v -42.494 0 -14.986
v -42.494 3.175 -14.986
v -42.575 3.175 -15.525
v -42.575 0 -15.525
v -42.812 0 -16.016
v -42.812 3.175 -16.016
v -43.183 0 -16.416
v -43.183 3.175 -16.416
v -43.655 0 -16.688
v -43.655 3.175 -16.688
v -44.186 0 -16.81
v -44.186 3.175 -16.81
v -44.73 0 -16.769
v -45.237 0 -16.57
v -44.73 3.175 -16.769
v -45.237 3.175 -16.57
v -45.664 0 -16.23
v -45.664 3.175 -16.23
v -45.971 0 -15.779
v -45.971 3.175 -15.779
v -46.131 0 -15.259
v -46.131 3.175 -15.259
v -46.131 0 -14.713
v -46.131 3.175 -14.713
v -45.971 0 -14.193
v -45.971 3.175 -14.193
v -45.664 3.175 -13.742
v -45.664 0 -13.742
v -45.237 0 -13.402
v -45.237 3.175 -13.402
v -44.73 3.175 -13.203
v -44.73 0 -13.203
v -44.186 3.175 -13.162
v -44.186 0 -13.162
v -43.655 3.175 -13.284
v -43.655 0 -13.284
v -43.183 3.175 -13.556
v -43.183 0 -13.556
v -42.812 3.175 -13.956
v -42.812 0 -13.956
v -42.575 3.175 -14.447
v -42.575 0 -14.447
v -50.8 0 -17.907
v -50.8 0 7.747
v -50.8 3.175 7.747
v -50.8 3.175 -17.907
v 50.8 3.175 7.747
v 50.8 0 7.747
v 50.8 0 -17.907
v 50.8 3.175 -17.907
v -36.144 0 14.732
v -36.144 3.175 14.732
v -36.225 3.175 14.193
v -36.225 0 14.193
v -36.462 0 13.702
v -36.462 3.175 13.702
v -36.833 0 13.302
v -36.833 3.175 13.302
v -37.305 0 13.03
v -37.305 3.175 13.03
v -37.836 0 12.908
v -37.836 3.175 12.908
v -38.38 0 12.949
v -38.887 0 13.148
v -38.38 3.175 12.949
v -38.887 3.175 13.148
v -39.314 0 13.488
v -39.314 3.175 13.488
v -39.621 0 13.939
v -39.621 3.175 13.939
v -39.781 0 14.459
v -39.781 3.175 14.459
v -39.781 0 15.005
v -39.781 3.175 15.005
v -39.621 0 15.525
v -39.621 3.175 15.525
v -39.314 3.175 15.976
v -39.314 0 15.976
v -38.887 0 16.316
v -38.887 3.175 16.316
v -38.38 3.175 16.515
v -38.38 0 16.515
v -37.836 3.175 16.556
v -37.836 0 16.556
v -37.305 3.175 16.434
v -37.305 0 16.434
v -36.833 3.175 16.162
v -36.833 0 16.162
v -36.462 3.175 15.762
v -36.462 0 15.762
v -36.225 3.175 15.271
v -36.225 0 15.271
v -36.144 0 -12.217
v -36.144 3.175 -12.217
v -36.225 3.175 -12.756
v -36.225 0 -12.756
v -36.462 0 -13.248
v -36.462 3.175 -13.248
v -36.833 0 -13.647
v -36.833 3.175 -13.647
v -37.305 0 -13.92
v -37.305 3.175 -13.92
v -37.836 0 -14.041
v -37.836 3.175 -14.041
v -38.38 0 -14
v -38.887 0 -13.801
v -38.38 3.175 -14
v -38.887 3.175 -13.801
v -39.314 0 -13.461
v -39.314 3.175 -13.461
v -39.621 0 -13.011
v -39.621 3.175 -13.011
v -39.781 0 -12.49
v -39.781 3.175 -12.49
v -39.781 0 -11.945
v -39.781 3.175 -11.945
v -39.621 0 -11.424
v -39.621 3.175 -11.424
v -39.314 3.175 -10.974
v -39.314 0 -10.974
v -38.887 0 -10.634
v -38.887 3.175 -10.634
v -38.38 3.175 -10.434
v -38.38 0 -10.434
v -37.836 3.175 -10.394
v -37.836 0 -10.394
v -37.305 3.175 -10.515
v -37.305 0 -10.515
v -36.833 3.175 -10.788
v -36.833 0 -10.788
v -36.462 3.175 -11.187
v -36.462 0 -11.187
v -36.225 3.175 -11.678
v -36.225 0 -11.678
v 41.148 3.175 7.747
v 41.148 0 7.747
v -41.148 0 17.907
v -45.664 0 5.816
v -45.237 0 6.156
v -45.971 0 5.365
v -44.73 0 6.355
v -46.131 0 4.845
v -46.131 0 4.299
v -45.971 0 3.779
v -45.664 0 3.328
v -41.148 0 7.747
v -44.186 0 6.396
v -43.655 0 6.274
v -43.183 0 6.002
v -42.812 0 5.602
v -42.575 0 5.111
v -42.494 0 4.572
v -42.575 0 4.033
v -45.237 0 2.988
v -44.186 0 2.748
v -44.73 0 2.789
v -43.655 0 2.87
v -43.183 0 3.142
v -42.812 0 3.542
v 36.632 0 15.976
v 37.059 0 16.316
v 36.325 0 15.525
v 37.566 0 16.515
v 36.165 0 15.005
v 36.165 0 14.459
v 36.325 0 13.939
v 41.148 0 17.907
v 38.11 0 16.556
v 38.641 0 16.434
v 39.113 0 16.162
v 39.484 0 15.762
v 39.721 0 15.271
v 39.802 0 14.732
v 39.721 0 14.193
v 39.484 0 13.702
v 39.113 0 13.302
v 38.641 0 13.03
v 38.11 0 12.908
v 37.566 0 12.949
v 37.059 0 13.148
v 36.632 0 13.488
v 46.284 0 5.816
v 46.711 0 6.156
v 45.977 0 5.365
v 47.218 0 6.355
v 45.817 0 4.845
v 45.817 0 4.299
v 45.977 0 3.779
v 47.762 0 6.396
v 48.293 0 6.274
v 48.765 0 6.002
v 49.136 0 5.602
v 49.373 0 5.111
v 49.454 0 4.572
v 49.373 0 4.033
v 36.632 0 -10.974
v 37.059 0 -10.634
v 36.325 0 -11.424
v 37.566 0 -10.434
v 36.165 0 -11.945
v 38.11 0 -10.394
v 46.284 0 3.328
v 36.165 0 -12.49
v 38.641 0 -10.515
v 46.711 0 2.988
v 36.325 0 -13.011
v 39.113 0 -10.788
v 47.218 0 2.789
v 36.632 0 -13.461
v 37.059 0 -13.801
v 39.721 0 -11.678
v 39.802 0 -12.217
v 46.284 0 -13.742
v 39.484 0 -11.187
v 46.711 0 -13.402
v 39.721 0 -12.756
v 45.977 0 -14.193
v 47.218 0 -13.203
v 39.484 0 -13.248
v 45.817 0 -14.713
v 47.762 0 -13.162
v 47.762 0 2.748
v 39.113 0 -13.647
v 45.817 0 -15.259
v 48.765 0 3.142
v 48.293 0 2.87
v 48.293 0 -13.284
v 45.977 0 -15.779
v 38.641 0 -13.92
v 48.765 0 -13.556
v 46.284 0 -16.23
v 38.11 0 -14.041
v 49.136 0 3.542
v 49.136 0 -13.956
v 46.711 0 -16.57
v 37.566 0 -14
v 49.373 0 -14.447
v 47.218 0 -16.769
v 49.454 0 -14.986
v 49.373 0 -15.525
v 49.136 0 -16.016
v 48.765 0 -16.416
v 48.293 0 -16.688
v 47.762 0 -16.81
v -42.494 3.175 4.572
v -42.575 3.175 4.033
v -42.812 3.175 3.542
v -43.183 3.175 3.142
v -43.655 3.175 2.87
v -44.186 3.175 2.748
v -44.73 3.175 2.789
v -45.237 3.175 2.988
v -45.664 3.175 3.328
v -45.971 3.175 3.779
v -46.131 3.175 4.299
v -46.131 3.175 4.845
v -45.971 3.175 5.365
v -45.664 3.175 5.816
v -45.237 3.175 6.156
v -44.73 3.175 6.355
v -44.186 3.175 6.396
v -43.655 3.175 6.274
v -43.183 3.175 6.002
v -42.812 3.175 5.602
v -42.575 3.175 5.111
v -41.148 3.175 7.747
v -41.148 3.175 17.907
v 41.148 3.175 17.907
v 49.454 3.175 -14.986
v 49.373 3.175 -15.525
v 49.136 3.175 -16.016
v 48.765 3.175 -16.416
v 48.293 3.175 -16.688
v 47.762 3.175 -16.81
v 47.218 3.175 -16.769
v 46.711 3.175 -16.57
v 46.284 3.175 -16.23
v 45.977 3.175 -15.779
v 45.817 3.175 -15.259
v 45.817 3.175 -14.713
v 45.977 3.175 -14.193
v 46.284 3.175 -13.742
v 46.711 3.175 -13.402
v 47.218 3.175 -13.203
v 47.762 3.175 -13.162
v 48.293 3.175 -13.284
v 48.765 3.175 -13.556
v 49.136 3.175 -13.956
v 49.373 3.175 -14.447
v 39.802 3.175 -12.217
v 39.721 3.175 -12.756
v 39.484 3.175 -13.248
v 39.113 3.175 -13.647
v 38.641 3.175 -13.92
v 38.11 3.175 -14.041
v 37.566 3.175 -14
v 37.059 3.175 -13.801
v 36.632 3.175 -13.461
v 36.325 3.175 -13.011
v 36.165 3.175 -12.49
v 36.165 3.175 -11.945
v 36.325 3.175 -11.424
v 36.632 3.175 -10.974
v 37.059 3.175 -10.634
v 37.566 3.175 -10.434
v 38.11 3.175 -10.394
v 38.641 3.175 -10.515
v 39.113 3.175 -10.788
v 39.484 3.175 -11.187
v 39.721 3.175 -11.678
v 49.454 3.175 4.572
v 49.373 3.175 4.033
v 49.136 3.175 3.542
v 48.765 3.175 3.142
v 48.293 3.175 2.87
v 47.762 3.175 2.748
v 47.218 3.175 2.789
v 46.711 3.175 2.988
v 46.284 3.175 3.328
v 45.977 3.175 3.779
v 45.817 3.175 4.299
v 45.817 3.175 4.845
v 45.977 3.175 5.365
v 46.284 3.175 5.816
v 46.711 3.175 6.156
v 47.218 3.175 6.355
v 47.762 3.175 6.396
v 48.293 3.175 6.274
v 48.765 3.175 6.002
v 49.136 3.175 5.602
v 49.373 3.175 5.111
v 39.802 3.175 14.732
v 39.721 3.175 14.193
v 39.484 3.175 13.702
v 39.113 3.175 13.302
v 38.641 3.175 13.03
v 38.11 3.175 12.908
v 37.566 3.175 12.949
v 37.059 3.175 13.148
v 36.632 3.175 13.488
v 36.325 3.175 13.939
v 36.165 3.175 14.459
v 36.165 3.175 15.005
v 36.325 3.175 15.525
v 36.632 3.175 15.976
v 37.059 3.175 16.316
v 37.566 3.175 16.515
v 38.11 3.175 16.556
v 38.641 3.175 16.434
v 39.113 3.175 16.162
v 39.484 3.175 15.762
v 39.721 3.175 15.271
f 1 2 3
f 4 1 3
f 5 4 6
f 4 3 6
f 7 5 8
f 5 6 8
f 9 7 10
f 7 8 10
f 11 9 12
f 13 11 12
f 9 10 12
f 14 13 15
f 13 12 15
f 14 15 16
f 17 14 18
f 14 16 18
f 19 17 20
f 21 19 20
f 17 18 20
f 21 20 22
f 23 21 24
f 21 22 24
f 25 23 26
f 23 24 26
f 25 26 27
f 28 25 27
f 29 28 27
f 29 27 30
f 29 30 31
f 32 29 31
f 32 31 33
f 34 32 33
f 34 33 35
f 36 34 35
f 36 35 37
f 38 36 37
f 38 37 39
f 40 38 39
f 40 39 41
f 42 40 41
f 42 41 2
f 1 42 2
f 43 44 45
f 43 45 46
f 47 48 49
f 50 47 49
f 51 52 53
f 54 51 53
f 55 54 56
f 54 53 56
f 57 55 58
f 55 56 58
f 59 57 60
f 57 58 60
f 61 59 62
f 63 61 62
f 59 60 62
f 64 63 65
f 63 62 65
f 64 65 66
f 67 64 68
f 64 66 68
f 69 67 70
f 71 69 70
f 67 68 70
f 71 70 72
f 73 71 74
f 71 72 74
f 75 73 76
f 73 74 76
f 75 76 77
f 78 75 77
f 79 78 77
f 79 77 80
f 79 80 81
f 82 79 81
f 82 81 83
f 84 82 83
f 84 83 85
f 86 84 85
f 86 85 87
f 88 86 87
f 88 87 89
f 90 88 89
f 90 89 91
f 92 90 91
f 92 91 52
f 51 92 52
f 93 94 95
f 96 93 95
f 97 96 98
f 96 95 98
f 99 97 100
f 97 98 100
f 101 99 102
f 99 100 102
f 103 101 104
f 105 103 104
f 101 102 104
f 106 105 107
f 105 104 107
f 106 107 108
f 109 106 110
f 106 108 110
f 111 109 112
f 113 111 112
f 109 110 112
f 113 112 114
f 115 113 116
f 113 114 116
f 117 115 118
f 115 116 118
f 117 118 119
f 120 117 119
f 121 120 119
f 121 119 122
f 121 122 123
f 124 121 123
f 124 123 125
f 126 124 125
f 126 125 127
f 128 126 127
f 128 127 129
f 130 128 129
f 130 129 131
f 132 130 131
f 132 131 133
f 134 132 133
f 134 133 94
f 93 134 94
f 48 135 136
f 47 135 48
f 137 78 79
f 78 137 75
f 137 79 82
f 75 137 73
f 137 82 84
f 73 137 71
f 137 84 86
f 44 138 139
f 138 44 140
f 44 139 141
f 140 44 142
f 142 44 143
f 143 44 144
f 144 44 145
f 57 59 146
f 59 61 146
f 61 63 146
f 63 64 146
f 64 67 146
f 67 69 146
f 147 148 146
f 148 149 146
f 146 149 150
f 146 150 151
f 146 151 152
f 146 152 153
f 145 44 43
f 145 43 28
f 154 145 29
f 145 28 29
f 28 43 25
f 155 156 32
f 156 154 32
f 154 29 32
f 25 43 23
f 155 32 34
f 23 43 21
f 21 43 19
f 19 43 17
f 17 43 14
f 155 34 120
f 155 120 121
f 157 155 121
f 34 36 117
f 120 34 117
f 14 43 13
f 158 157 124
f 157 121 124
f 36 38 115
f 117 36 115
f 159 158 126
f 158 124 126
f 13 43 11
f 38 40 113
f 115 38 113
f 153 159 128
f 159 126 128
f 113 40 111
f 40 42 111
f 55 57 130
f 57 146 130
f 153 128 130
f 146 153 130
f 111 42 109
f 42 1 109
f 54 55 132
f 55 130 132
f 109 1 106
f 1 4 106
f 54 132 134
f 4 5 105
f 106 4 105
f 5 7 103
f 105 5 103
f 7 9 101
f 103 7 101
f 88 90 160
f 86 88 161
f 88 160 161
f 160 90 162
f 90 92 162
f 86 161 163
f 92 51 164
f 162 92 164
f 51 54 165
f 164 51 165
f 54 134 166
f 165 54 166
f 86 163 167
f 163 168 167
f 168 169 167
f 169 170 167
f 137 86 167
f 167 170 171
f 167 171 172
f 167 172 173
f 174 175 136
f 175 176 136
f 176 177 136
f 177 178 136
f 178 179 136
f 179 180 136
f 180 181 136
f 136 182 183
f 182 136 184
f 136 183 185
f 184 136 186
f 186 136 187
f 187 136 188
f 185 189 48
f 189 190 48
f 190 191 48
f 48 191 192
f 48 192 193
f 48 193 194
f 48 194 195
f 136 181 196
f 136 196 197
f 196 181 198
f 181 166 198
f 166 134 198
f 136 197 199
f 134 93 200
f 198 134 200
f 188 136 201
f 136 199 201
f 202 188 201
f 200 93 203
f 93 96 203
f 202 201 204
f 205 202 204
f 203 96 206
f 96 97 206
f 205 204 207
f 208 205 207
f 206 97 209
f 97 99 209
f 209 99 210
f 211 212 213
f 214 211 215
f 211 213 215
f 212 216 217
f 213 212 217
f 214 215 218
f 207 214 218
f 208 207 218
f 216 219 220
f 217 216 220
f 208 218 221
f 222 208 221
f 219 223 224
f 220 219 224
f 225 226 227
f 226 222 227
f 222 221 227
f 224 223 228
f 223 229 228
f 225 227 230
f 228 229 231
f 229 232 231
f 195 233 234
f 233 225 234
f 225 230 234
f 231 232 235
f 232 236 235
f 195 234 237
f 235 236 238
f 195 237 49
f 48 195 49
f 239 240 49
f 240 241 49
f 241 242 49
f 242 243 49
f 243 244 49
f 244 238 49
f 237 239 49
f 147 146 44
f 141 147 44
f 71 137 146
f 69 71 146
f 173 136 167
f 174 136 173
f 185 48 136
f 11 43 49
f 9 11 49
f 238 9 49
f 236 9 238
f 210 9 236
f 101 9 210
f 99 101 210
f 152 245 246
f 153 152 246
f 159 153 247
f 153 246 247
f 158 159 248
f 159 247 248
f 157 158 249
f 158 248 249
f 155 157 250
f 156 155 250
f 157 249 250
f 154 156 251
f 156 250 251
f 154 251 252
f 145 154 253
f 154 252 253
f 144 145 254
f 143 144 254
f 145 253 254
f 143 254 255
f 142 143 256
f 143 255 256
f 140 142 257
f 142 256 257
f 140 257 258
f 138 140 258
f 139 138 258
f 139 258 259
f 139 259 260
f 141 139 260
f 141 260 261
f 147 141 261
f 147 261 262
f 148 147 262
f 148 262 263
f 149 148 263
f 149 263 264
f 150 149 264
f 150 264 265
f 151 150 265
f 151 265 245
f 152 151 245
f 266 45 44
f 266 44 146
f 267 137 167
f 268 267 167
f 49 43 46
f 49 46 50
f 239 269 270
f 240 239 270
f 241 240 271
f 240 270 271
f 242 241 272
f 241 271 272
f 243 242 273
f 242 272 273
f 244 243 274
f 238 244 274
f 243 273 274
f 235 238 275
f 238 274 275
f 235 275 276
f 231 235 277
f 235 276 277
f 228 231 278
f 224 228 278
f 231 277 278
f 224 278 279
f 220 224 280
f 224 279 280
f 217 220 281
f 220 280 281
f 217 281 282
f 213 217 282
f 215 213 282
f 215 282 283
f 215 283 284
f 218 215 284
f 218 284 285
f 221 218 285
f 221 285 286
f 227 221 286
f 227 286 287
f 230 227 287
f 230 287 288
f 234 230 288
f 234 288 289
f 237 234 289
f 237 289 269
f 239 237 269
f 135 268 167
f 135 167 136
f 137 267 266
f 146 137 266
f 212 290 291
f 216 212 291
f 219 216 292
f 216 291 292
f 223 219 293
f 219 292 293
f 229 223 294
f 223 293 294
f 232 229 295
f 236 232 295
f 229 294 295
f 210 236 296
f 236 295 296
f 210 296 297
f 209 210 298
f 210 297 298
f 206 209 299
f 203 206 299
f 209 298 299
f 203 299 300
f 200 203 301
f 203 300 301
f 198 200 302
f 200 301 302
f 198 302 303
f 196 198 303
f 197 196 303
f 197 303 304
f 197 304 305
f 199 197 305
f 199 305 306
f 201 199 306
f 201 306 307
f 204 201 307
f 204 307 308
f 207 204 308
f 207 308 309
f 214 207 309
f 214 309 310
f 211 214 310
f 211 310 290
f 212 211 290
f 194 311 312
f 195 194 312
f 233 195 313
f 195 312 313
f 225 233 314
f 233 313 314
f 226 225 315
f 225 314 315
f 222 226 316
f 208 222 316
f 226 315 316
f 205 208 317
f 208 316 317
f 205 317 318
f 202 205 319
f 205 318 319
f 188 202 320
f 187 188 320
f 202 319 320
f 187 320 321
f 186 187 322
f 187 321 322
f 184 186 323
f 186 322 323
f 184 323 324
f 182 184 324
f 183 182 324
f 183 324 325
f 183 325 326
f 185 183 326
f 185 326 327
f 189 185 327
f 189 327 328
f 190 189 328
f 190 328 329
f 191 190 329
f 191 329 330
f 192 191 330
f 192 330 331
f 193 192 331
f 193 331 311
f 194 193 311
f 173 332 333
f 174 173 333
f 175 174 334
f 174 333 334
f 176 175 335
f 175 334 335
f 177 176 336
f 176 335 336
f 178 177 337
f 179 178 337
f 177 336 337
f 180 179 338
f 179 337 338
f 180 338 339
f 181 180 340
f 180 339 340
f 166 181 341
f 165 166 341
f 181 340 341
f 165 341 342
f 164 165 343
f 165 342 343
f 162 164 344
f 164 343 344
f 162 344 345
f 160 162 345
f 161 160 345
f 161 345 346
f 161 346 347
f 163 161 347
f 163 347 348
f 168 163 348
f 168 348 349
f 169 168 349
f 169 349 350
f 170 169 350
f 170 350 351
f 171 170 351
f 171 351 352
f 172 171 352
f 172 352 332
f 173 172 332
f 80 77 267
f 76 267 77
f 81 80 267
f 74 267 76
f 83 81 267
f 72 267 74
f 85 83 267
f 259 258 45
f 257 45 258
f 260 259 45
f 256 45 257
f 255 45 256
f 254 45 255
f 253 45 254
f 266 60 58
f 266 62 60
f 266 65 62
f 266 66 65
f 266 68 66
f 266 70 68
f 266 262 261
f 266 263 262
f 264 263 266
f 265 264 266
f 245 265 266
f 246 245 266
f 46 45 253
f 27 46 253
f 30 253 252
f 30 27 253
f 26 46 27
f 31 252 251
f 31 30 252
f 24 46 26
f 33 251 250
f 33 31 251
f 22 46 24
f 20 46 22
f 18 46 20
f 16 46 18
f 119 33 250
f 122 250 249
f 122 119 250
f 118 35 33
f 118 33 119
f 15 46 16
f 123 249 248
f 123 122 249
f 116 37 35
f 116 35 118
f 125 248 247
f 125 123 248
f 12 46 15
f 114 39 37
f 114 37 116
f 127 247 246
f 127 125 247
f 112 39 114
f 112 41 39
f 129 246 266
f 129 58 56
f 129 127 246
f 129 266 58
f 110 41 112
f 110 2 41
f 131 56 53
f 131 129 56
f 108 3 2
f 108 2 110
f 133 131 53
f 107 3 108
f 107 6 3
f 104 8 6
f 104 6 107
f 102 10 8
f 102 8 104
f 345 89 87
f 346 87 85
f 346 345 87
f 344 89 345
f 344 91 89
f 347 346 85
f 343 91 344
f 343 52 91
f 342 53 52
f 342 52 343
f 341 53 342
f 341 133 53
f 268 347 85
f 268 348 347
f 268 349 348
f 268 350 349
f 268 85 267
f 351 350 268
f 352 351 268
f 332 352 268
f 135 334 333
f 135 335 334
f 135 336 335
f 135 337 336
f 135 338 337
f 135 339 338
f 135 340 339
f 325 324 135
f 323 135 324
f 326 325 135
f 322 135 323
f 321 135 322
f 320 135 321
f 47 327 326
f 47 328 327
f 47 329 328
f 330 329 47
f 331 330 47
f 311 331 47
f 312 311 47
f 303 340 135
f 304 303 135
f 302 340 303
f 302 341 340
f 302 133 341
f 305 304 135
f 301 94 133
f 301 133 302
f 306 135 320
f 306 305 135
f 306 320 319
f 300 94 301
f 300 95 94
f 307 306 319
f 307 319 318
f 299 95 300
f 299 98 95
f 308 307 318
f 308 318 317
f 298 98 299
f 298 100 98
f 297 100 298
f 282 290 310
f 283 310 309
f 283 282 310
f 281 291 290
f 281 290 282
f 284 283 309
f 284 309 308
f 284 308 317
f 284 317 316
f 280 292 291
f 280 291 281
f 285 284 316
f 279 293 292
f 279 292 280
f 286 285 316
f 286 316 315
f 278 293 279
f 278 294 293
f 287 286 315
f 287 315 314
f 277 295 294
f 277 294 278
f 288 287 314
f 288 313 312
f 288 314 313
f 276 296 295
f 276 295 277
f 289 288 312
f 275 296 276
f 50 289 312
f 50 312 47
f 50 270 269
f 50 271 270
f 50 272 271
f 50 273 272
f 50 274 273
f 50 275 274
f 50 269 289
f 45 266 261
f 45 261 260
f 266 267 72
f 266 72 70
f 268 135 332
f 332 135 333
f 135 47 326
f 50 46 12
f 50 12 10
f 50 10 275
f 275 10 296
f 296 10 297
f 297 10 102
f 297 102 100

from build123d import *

# Parameters (mm, degrees)
SKETCH2_W           = 101.6
SKETCH2_H           = 35.814
BOSS_EXTRUDE1_DEPTH = 3.175
SKETCH3_R           = 1.8288
CUT_EXTRUDE1_DEPTH  = 4.175
SKETCH4_R           = 1.8288
CUT_EXTRUDE2_DEPTH  = 4.175
SKETCH5_W           = 9.651618186
SKETCH5_H           = 10.16
CUT_EXTRUDE3_DEPTH  = 4.175


with BuildPart() as part:
    # Sketch2 → Boss-Extrude1 (new body)
    with BuildSketch(Plane(origin=(0, 0, 0), x_dir=(1, 0, 0), z_dir=(0, 1, 0))):
        Rectangle(SKETCH2_W, SKETCH2_H)
    extrude(amount=BOSS_EXTRUDE1_DEPTH)

    # Sketch3 → Cut-Extrude1 (cut, through all)
    with BuildSketch(Plane(origin=(0, 3.175, 0), x_dir=(1, 0, 0), z_dir=(0, 1, 0))):
        with Locations((47.625, 14.986)):
            Circle(SKETCH3_R)
        with Locations((47.625, -4.572)):
            Circle(SKETCH3_R)
        with Locations((-44.323, 14.986)):
            Circle(SKETCH3_R)
        with Locations((-44.323, -4.572)):
            Circle(SKETCH3_R)
    extrude(amount=-CUT_EXTRUDE1_DEPTH, mode=Mode.SUBTRACT)

    # Sketch4 → Cut-Extrude2 (cut, through all)
    with BuildSketch(Plane(origin=(0, 3.175, 0), x_dir=(1, 0, 0), z_dir=(0, 1, 0))):
        with Locations((-37.973, -14.732)):
            Circle(SKETCH4_R)
        with Locations((-37.973, 12.2174)):
            Circle(SKETCH4_R)
        with Locations((37.973, -14.732)):
            Circle(SKETCH4_R)
        with Locations((37.973, 12.2174)):
            Circle(SKETCH4_R)
    extrude(amount=-CUT_EXTRUDE2_DEPTH, mode=Mode.SUBTRACT)

    # Sketch5 → Cut-Extrude3 (cut, through all)
    with BuildSketch(Plane(origin=(0, 3.175, 0), x_dir=(1, 0, 0), z_dir=(0, 1, 0))):
        with Locations((45.974190907, -12.827)):
            Rectangle(SKETCH5_W, SKETCH5_H)
        with Locations((-45.974190907, -12.827)):
            Rectangle(SKETCH5_W, SKETCH5_H)
    extrude(amount=-CUT_EXTRUDE3_DEPTH, mode=Mode.SUBTRACT)


solid = part.part
